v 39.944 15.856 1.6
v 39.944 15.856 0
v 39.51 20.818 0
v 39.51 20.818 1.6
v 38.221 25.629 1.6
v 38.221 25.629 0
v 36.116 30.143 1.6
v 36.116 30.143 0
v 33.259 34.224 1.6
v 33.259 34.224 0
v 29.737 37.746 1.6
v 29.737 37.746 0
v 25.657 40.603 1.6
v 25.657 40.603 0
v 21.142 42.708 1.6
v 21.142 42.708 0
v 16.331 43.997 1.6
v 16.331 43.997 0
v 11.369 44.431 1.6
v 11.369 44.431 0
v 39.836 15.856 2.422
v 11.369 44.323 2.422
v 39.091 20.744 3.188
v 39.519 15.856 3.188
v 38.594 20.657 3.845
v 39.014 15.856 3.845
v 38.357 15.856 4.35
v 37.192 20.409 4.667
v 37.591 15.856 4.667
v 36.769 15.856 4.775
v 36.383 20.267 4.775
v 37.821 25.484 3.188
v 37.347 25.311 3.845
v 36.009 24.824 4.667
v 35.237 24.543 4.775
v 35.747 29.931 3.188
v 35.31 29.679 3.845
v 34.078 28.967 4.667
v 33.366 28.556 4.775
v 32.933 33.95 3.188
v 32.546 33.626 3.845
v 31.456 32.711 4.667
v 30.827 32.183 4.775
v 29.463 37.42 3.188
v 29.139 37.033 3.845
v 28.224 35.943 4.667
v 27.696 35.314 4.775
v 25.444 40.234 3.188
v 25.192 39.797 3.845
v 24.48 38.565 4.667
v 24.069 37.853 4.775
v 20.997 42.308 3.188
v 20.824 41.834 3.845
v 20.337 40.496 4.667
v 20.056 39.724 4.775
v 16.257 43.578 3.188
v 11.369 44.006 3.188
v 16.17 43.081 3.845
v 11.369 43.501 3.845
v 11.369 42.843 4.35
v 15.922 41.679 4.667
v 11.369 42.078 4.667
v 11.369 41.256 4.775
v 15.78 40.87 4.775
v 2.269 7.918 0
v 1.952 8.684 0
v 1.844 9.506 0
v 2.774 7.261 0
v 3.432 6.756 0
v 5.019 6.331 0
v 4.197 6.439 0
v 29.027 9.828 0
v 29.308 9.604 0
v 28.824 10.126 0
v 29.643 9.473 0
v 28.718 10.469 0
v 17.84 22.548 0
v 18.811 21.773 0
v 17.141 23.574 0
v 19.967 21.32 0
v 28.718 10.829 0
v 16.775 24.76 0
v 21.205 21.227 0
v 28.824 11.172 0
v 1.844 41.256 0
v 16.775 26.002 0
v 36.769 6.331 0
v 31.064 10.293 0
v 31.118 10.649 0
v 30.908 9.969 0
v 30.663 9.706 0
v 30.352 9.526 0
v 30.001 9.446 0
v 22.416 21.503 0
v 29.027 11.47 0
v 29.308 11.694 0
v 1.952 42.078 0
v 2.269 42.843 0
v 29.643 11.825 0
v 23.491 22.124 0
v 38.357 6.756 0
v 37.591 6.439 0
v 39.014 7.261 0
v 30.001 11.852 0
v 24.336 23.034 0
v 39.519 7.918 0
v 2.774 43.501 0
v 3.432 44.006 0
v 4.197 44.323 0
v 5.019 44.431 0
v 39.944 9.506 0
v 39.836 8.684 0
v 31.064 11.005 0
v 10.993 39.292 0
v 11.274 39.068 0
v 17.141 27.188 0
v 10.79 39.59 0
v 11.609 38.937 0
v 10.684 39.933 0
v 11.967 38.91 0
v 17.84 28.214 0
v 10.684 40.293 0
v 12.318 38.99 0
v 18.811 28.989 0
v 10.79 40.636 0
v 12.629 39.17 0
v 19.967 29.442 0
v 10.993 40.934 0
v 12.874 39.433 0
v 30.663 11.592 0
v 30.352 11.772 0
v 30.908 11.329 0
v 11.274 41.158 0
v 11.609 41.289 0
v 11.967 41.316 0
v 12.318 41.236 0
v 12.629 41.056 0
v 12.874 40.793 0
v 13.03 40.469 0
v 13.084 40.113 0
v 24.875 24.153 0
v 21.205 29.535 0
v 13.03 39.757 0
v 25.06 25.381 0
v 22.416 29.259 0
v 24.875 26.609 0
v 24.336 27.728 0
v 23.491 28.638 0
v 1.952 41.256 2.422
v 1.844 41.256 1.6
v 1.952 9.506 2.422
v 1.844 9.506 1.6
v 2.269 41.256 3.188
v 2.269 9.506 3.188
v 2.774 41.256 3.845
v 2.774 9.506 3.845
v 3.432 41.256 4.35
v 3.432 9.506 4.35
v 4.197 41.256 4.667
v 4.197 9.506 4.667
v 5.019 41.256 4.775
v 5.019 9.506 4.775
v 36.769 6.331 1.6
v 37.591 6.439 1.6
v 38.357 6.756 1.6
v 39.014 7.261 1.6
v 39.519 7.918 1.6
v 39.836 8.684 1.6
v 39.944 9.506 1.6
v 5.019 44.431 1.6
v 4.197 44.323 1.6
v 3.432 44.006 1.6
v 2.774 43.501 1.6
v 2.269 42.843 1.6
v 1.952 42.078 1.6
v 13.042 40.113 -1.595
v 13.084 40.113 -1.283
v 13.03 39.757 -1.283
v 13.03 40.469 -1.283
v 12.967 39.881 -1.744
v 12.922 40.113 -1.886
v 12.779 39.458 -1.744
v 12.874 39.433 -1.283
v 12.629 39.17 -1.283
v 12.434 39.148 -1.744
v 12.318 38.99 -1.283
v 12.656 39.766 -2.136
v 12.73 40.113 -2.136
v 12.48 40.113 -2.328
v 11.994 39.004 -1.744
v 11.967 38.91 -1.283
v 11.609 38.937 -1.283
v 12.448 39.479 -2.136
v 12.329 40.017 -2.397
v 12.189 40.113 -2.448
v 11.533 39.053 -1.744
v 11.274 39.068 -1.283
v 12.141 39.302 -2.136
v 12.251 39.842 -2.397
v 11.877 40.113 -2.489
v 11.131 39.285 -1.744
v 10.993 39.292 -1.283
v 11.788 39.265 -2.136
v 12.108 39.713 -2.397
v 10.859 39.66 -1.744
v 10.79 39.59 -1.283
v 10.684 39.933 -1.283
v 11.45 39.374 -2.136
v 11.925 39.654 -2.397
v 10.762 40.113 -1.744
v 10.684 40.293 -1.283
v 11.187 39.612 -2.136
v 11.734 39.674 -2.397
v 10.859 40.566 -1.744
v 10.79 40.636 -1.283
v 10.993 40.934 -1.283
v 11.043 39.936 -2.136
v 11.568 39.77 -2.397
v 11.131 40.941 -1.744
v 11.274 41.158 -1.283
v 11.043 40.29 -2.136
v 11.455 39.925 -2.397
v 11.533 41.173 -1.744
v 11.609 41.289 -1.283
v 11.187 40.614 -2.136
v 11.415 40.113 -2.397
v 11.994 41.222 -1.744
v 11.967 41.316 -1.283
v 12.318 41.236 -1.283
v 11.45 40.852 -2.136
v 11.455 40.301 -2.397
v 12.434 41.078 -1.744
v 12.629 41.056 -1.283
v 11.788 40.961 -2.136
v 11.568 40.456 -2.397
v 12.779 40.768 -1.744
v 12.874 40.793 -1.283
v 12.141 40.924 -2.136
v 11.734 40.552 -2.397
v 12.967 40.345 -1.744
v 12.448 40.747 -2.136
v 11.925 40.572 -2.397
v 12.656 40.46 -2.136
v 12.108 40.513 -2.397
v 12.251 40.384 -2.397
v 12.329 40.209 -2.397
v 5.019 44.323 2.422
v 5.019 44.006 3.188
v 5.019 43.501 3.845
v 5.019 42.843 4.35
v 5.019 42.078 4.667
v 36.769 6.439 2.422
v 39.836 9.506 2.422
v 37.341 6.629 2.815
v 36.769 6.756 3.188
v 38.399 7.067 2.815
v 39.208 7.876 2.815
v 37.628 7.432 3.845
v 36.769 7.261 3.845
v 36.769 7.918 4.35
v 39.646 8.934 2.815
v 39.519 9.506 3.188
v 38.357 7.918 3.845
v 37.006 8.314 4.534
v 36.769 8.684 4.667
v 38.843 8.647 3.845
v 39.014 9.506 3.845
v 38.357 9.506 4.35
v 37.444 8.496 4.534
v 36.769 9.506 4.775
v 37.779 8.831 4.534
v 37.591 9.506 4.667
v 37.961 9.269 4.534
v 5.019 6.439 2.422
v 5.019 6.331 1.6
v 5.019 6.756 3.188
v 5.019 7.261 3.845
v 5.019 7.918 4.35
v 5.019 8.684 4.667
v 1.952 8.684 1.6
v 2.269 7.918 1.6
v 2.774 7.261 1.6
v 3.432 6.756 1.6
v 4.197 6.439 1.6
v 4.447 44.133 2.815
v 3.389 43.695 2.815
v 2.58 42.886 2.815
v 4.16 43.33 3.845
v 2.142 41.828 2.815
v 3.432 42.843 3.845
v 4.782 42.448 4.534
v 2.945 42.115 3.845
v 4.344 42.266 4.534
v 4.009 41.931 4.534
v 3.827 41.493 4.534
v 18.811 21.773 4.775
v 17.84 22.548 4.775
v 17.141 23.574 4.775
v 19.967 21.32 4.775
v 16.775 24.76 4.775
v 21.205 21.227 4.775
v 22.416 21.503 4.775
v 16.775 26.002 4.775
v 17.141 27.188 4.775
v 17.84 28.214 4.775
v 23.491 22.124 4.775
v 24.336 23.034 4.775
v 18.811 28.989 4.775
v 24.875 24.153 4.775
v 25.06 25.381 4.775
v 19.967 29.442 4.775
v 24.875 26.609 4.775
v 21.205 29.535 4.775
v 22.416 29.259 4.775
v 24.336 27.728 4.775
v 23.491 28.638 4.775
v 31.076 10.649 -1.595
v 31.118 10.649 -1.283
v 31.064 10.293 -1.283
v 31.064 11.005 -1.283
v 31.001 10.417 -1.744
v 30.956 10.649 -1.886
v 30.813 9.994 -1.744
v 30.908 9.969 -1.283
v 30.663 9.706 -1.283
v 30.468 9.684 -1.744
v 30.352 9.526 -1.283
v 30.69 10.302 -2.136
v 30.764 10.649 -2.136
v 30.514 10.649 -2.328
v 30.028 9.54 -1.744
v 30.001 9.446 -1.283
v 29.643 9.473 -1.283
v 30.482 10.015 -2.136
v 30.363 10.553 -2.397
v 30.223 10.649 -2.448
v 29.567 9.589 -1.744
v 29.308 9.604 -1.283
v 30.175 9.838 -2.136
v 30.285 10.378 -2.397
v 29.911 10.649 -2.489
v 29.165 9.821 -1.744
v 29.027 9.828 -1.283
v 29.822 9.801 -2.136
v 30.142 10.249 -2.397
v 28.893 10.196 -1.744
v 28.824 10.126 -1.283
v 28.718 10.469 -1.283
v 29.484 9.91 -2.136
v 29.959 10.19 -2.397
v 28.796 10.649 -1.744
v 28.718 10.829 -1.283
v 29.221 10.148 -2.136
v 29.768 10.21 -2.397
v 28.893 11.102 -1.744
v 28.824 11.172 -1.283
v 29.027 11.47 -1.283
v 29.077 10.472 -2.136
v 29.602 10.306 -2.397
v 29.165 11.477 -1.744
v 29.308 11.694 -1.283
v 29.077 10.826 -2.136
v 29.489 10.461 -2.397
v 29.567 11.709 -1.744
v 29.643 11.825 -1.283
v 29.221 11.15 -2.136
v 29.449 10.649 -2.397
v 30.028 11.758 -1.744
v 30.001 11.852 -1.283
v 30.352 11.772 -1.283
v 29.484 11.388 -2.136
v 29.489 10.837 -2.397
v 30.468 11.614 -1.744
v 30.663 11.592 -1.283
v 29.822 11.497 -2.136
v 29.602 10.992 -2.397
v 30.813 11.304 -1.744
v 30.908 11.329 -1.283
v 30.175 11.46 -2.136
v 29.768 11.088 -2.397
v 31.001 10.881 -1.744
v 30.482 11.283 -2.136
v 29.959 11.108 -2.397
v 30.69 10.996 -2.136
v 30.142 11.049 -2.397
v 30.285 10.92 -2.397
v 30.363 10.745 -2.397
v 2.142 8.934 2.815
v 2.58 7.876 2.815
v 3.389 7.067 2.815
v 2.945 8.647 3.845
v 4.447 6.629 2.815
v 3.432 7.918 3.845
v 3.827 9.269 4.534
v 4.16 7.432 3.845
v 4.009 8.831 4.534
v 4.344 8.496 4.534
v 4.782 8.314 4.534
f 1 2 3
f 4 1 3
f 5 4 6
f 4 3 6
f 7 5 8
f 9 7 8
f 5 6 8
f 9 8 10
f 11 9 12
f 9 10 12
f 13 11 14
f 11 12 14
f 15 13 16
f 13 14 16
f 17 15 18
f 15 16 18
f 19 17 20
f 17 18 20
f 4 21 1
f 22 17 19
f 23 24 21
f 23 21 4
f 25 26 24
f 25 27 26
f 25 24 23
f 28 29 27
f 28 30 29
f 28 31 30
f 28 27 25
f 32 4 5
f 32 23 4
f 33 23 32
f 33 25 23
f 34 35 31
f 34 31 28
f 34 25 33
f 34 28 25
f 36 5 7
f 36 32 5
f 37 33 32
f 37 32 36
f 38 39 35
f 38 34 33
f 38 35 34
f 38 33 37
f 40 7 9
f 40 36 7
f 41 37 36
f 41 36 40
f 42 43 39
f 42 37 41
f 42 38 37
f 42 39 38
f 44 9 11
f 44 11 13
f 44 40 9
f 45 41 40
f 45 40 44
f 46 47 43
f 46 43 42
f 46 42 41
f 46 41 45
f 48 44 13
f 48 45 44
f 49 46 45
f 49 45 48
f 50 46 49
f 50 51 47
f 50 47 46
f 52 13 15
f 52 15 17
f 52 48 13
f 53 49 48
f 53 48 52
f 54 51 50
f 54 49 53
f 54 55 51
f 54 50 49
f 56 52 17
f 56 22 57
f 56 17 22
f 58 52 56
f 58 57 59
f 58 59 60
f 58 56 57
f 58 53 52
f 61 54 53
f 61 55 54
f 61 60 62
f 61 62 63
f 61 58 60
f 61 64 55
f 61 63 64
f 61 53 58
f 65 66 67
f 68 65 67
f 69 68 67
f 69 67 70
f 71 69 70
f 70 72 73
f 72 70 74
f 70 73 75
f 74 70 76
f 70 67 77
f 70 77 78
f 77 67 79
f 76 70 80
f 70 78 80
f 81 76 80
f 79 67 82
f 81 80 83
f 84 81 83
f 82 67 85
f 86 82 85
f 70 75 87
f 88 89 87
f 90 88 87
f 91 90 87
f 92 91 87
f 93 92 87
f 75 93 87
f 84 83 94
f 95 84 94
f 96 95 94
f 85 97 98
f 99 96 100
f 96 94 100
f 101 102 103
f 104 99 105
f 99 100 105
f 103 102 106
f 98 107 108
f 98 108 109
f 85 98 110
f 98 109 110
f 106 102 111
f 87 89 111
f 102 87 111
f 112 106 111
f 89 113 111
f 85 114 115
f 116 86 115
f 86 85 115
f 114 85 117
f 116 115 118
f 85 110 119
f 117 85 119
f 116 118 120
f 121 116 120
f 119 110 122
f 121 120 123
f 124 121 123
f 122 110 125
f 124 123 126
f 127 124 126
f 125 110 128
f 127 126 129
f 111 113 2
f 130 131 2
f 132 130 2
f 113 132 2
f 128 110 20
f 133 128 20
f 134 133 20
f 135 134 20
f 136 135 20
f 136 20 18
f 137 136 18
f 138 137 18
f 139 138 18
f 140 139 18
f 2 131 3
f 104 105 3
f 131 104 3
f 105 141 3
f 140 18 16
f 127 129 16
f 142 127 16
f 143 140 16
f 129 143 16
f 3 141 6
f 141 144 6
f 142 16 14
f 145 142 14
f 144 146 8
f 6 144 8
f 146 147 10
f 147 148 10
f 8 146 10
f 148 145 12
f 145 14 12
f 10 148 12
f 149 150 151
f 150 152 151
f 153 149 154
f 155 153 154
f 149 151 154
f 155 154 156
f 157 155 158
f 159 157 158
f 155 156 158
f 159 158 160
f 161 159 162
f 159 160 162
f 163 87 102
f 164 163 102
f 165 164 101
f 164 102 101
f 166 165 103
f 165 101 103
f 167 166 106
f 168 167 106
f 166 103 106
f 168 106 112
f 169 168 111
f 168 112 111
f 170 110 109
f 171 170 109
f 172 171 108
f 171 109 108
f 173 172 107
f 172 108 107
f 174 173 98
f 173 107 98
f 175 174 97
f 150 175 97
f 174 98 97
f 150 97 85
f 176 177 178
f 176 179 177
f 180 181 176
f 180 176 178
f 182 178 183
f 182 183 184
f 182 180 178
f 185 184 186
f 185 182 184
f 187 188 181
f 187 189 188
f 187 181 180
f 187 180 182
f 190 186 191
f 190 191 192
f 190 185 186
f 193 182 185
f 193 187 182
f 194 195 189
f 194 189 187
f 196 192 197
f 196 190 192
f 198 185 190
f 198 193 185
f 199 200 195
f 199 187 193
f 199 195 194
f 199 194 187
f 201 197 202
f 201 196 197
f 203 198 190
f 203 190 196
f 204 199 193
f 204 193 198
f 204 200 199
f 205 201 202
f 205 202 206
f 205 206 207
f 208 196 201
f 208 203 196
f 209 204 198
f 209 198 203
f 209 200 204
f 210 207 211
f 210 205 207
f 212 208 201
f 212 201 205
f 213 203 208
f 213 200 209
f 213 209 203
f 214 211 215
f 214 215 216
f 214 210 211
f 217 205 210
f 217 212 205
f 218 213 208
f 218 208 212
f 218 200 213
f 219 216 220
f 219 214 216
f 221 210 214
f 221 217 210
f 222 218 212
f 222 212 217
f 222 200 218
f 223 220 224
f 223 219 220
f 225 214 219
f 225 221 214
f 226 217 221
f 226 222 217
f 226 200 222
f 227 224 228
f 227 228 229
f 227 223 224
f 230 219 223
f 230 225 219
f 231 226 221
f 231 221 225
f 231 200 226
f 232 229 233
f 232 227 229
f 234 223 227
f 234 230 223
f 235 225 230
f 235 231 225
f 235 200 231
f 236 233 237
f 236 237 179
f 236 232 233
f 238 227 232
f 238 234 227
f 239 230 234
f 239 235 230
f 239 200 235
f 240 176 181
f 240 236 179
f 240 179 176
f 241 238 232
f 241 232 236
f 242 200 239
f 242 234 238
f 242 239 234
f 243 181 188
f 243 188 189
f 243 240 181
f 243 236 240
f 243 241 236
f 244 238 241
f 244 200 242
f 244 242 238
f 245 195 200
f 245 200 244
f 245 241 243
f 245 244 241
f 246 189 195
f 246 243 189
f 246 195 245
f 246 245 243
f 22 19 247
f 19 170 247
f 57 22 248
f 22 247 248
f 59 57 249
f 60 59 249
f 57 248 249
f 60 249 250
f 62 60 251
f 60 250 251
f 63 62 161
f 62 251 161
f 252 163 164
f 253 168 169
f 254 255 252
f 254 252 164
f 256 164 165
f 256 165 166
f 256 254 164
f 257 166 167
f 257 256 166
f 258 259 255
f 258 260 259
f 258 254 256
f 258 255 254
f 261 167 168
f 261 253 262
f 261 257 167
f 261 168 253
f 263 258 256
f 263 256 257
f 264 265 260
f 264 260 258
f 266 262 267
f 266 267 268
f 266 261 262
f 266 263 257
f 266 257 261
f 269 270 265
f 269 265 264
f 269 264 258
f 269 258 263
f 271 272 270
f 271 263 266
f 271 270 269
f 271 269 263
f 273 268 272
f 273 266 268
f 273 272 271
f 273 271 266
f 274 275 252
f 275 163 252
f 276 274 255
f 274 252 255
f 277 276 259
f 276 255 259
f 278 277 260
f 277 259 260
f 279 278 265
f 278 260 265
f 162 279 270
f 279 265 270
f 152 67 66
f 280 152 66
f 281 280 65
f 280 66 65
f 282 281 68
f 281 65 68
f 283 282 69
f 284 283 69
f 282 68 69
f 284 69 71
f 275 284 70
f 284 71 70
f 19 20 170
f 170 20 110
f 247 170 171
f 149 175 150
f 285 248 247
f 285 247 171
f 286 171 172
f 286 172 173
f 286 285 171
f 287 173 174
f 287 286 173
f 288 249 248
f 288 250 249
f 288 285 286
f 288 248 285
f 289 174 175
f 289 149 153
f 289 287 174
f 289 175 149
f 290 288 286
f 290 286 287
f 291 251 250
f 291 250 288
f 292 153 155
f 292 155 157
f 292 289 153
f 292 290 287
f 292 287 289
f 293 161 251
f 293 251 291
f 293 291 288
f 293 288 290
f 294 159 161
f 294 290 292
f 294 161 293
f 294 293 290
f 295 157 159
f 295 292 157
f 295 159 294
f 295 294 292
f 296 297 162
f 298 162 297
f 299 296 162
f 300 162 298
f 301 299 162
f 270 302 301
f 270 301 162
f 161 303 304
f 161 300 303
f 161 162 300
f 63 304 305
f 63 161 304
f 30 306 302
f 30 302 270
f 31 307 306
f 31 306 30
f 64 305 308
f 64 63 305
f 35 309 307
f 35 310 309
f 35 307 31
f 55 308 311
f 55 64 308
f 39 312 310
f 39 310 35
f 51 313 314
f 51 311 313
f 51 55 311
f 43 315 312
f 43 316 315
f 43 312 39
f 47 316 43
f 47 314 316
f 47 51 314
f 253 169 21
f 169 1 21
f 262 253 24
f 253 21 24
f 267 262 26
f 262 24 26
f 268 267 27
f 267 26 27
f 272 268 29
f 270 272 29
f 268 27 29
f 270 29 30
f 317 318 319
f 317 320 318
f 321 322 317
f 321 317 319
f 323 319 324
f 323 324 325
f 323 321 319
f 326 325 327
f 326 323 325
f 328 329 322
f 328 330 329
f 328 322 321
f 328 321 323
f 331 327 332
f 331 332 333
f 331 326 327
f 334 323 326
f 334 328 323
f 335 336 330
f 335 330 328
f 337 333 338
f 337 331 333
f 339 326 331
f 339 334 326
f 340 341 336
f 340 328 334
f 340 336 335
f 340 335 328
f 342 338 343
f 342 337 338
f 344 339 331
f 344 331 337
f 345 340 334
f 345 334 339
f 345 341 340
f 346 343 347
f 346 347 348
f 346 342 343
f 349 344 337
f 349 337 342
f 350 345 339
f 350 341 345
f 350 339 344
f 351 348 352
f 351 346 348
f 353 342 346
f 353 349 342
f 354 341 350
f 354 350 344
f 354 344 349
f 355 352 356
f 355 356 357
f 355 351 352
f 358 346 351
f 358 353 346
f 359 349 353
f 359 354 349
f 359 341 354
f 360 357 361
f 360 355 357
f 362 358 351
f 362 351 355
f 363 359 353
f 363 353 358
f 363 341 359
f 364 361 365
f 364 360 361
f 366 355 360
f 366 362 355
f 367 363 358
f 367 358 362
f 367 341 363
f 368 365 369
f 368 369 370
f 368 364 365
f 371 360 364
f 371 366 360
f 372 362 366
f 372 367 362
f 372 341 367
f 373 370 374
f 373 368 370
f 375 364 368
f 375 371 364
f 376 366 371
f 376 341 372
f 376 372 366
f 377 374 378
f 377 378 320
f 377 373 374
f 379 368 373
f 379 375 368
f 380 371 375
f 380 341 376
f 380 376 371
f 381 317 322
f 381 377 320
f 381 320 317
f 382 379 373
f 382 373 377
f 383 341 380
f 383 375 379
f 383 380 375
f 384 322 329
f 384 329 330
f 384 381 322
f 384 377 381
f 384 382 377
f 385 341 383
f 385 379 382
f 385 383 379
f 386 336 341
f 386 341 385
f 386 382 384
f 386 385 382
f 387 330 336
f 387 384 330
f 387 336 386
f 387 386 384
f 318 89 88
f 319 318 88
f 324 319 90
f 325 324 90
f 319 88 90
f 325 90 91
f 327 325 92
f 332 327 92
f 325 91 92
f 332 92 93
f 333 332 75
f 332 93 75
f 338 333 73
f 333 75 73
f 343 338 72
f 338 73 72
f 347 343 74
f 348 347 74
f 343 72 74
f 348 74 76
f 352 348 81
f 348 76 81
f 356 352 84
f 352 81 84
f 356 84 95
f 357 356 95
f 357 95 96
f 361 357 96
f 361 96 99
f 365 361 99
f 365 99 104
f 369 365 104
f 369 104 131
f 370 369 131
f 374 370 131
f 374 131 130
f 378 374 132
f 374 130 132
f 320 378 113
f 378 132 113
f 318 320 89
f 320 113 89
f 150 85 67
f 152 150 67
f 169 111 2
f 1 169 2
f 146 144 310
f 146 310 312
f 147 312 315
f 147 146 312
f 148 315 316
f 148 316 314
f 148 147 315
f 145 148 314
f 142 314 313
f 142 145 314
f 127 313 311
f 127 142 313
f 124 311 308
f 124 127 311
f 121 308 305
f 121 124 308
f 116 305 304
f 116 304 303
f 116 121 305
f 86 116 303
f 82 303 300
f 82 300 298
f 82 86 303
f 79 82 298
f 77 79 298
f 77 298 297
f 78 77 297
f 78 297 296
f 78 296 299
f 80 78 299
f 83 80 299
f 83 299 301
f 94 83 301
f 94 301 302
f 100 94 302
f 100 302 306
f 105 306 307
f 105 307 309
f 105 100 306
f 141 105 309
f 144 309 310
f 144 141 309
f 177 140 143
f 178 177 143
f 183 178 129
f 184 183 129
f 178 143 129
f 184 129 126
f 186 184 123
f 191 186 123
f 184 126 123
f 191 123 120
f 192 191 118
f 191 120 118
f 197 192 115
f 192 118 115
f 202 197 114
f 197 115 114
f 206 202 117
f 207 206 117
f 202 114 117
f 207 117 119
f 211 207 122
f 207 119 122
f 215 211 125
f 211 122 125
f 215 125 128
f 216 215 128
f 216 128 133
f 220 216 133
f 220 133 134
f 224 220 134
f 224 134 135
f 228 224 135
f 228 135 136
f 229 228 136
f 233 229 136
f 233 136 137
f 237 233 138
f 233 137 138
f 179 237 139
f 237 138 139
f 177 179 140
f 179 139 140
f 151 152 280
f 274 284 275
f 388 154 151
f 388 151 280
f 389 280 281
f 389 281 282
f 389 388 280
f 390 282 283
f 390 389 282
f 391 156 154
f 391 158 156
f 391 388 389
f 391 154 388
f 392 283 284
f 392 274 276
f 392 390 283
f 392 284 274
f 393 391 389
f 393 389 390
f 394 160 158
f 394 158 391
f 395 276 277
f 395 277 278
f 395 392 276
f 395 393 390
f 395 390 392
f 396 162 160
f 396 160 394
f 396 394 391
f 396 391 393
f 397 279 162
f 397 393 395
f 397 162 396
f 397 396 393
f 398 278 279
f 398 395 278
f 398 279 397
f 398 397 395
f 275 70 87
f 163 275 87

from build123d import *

# Parameters (mm, degrees)
SKETCH1_R      = 4.1656
EXTRUDE1_DEPTH = 4.7752
FILLET1_R      = 3.175
SKETCH2_R      = 1.2065
EXTRUDE2_DEPTH = 2.4892
FILLET2_R      = 1.2065


with BuildPart() as part:
    # Sketch1 → Extrude1 (new body)
    with BuildSketch(Plane.XY):
        with BuildLine():
            Line((39.944028629, 9.505986328), (39.944028629, 15.855986328))
            ThreePointArc((39.944028629, 15.855986328), (31.574604902, 36.0615626), (11.369028629, 44.430986328))
            Line((11.369028629, 44.430986328), (5.019028629, 44.430986328))
            ThreePointArc((5.019028629, 44.430986328), (2.773964599, 43.501050358), (1.844028629, 41.255986328))
            Line((1.844028629, 41.255986328), (1.844028629, 9.505986328))
            ThreePointArc((1.844028629, 9.505986328), (2.773964599, 7.260922298), (5.019028629, 6.330986328))
            Line((5.019028629, 6.330986328), (36.769028629, 6.330986328))
            ThreePointArc((36.769028629, 6.330986328), (39.014092659, 7.260922298), (39.944028629, 9.505986328))
        make_face()
        with Locations((20.894028629, 25.380986328)):
            Circle(SKETCH1_R, mode=Mode.SUBTRACT)
    extrude(amount=EXTRUDE1_DEPTH)

    # Fillet1
    fillet1_edges = [part.edges().sort_by_distance(p)[0] for p in [
        (39.944028629, 12.680986328, 4.7752),
        (31.574604902, 36.0615626, 4.7752),
        (8.194028629, 44.430986328, 4.7752),
        (2.773964599, 43.501050358, 4.7752),
        (1.844028629, 25.380986328, 4.7752),
        (2.773964599, 7.260922298, 4.7752),
        (20.894028629, 6.330986328, 4.7752),
        (39.014092659, 7.260922298, 4.7752),
    ]]
    fillet(fillet1_edges, radius=FILLET1_R)

    # Sketch2 → Extrude2 (add)
    with BuildSketch(Plane(origin=(0, 0, 0), x_dir=(-1, 0, 0), z_dir=(0, 0, -1))):
        with Locations(Location((-29.911028629, 10.648986328, 0), (0, 0, 180))):
            Circle(SKETCH2_R)
        with Locations(Location((-11.877028629, 40.112986328, 0), (0, 0, 180))):
            Circle(SKETCH2_R)
    extrude(amount=EXTRUDE2_DEPTH)

    # Fillet2
    fillet2_edges = [part.edges().sort_by_distance(p)[0] for p in [
        (28.704528629, 10.648986328, -2.4892),
        (10.670528629, 40.112986328, -2.4892),
    ]]
    fillet(fillet2_edges, radius=FILLET2_R)


solid = part.part
